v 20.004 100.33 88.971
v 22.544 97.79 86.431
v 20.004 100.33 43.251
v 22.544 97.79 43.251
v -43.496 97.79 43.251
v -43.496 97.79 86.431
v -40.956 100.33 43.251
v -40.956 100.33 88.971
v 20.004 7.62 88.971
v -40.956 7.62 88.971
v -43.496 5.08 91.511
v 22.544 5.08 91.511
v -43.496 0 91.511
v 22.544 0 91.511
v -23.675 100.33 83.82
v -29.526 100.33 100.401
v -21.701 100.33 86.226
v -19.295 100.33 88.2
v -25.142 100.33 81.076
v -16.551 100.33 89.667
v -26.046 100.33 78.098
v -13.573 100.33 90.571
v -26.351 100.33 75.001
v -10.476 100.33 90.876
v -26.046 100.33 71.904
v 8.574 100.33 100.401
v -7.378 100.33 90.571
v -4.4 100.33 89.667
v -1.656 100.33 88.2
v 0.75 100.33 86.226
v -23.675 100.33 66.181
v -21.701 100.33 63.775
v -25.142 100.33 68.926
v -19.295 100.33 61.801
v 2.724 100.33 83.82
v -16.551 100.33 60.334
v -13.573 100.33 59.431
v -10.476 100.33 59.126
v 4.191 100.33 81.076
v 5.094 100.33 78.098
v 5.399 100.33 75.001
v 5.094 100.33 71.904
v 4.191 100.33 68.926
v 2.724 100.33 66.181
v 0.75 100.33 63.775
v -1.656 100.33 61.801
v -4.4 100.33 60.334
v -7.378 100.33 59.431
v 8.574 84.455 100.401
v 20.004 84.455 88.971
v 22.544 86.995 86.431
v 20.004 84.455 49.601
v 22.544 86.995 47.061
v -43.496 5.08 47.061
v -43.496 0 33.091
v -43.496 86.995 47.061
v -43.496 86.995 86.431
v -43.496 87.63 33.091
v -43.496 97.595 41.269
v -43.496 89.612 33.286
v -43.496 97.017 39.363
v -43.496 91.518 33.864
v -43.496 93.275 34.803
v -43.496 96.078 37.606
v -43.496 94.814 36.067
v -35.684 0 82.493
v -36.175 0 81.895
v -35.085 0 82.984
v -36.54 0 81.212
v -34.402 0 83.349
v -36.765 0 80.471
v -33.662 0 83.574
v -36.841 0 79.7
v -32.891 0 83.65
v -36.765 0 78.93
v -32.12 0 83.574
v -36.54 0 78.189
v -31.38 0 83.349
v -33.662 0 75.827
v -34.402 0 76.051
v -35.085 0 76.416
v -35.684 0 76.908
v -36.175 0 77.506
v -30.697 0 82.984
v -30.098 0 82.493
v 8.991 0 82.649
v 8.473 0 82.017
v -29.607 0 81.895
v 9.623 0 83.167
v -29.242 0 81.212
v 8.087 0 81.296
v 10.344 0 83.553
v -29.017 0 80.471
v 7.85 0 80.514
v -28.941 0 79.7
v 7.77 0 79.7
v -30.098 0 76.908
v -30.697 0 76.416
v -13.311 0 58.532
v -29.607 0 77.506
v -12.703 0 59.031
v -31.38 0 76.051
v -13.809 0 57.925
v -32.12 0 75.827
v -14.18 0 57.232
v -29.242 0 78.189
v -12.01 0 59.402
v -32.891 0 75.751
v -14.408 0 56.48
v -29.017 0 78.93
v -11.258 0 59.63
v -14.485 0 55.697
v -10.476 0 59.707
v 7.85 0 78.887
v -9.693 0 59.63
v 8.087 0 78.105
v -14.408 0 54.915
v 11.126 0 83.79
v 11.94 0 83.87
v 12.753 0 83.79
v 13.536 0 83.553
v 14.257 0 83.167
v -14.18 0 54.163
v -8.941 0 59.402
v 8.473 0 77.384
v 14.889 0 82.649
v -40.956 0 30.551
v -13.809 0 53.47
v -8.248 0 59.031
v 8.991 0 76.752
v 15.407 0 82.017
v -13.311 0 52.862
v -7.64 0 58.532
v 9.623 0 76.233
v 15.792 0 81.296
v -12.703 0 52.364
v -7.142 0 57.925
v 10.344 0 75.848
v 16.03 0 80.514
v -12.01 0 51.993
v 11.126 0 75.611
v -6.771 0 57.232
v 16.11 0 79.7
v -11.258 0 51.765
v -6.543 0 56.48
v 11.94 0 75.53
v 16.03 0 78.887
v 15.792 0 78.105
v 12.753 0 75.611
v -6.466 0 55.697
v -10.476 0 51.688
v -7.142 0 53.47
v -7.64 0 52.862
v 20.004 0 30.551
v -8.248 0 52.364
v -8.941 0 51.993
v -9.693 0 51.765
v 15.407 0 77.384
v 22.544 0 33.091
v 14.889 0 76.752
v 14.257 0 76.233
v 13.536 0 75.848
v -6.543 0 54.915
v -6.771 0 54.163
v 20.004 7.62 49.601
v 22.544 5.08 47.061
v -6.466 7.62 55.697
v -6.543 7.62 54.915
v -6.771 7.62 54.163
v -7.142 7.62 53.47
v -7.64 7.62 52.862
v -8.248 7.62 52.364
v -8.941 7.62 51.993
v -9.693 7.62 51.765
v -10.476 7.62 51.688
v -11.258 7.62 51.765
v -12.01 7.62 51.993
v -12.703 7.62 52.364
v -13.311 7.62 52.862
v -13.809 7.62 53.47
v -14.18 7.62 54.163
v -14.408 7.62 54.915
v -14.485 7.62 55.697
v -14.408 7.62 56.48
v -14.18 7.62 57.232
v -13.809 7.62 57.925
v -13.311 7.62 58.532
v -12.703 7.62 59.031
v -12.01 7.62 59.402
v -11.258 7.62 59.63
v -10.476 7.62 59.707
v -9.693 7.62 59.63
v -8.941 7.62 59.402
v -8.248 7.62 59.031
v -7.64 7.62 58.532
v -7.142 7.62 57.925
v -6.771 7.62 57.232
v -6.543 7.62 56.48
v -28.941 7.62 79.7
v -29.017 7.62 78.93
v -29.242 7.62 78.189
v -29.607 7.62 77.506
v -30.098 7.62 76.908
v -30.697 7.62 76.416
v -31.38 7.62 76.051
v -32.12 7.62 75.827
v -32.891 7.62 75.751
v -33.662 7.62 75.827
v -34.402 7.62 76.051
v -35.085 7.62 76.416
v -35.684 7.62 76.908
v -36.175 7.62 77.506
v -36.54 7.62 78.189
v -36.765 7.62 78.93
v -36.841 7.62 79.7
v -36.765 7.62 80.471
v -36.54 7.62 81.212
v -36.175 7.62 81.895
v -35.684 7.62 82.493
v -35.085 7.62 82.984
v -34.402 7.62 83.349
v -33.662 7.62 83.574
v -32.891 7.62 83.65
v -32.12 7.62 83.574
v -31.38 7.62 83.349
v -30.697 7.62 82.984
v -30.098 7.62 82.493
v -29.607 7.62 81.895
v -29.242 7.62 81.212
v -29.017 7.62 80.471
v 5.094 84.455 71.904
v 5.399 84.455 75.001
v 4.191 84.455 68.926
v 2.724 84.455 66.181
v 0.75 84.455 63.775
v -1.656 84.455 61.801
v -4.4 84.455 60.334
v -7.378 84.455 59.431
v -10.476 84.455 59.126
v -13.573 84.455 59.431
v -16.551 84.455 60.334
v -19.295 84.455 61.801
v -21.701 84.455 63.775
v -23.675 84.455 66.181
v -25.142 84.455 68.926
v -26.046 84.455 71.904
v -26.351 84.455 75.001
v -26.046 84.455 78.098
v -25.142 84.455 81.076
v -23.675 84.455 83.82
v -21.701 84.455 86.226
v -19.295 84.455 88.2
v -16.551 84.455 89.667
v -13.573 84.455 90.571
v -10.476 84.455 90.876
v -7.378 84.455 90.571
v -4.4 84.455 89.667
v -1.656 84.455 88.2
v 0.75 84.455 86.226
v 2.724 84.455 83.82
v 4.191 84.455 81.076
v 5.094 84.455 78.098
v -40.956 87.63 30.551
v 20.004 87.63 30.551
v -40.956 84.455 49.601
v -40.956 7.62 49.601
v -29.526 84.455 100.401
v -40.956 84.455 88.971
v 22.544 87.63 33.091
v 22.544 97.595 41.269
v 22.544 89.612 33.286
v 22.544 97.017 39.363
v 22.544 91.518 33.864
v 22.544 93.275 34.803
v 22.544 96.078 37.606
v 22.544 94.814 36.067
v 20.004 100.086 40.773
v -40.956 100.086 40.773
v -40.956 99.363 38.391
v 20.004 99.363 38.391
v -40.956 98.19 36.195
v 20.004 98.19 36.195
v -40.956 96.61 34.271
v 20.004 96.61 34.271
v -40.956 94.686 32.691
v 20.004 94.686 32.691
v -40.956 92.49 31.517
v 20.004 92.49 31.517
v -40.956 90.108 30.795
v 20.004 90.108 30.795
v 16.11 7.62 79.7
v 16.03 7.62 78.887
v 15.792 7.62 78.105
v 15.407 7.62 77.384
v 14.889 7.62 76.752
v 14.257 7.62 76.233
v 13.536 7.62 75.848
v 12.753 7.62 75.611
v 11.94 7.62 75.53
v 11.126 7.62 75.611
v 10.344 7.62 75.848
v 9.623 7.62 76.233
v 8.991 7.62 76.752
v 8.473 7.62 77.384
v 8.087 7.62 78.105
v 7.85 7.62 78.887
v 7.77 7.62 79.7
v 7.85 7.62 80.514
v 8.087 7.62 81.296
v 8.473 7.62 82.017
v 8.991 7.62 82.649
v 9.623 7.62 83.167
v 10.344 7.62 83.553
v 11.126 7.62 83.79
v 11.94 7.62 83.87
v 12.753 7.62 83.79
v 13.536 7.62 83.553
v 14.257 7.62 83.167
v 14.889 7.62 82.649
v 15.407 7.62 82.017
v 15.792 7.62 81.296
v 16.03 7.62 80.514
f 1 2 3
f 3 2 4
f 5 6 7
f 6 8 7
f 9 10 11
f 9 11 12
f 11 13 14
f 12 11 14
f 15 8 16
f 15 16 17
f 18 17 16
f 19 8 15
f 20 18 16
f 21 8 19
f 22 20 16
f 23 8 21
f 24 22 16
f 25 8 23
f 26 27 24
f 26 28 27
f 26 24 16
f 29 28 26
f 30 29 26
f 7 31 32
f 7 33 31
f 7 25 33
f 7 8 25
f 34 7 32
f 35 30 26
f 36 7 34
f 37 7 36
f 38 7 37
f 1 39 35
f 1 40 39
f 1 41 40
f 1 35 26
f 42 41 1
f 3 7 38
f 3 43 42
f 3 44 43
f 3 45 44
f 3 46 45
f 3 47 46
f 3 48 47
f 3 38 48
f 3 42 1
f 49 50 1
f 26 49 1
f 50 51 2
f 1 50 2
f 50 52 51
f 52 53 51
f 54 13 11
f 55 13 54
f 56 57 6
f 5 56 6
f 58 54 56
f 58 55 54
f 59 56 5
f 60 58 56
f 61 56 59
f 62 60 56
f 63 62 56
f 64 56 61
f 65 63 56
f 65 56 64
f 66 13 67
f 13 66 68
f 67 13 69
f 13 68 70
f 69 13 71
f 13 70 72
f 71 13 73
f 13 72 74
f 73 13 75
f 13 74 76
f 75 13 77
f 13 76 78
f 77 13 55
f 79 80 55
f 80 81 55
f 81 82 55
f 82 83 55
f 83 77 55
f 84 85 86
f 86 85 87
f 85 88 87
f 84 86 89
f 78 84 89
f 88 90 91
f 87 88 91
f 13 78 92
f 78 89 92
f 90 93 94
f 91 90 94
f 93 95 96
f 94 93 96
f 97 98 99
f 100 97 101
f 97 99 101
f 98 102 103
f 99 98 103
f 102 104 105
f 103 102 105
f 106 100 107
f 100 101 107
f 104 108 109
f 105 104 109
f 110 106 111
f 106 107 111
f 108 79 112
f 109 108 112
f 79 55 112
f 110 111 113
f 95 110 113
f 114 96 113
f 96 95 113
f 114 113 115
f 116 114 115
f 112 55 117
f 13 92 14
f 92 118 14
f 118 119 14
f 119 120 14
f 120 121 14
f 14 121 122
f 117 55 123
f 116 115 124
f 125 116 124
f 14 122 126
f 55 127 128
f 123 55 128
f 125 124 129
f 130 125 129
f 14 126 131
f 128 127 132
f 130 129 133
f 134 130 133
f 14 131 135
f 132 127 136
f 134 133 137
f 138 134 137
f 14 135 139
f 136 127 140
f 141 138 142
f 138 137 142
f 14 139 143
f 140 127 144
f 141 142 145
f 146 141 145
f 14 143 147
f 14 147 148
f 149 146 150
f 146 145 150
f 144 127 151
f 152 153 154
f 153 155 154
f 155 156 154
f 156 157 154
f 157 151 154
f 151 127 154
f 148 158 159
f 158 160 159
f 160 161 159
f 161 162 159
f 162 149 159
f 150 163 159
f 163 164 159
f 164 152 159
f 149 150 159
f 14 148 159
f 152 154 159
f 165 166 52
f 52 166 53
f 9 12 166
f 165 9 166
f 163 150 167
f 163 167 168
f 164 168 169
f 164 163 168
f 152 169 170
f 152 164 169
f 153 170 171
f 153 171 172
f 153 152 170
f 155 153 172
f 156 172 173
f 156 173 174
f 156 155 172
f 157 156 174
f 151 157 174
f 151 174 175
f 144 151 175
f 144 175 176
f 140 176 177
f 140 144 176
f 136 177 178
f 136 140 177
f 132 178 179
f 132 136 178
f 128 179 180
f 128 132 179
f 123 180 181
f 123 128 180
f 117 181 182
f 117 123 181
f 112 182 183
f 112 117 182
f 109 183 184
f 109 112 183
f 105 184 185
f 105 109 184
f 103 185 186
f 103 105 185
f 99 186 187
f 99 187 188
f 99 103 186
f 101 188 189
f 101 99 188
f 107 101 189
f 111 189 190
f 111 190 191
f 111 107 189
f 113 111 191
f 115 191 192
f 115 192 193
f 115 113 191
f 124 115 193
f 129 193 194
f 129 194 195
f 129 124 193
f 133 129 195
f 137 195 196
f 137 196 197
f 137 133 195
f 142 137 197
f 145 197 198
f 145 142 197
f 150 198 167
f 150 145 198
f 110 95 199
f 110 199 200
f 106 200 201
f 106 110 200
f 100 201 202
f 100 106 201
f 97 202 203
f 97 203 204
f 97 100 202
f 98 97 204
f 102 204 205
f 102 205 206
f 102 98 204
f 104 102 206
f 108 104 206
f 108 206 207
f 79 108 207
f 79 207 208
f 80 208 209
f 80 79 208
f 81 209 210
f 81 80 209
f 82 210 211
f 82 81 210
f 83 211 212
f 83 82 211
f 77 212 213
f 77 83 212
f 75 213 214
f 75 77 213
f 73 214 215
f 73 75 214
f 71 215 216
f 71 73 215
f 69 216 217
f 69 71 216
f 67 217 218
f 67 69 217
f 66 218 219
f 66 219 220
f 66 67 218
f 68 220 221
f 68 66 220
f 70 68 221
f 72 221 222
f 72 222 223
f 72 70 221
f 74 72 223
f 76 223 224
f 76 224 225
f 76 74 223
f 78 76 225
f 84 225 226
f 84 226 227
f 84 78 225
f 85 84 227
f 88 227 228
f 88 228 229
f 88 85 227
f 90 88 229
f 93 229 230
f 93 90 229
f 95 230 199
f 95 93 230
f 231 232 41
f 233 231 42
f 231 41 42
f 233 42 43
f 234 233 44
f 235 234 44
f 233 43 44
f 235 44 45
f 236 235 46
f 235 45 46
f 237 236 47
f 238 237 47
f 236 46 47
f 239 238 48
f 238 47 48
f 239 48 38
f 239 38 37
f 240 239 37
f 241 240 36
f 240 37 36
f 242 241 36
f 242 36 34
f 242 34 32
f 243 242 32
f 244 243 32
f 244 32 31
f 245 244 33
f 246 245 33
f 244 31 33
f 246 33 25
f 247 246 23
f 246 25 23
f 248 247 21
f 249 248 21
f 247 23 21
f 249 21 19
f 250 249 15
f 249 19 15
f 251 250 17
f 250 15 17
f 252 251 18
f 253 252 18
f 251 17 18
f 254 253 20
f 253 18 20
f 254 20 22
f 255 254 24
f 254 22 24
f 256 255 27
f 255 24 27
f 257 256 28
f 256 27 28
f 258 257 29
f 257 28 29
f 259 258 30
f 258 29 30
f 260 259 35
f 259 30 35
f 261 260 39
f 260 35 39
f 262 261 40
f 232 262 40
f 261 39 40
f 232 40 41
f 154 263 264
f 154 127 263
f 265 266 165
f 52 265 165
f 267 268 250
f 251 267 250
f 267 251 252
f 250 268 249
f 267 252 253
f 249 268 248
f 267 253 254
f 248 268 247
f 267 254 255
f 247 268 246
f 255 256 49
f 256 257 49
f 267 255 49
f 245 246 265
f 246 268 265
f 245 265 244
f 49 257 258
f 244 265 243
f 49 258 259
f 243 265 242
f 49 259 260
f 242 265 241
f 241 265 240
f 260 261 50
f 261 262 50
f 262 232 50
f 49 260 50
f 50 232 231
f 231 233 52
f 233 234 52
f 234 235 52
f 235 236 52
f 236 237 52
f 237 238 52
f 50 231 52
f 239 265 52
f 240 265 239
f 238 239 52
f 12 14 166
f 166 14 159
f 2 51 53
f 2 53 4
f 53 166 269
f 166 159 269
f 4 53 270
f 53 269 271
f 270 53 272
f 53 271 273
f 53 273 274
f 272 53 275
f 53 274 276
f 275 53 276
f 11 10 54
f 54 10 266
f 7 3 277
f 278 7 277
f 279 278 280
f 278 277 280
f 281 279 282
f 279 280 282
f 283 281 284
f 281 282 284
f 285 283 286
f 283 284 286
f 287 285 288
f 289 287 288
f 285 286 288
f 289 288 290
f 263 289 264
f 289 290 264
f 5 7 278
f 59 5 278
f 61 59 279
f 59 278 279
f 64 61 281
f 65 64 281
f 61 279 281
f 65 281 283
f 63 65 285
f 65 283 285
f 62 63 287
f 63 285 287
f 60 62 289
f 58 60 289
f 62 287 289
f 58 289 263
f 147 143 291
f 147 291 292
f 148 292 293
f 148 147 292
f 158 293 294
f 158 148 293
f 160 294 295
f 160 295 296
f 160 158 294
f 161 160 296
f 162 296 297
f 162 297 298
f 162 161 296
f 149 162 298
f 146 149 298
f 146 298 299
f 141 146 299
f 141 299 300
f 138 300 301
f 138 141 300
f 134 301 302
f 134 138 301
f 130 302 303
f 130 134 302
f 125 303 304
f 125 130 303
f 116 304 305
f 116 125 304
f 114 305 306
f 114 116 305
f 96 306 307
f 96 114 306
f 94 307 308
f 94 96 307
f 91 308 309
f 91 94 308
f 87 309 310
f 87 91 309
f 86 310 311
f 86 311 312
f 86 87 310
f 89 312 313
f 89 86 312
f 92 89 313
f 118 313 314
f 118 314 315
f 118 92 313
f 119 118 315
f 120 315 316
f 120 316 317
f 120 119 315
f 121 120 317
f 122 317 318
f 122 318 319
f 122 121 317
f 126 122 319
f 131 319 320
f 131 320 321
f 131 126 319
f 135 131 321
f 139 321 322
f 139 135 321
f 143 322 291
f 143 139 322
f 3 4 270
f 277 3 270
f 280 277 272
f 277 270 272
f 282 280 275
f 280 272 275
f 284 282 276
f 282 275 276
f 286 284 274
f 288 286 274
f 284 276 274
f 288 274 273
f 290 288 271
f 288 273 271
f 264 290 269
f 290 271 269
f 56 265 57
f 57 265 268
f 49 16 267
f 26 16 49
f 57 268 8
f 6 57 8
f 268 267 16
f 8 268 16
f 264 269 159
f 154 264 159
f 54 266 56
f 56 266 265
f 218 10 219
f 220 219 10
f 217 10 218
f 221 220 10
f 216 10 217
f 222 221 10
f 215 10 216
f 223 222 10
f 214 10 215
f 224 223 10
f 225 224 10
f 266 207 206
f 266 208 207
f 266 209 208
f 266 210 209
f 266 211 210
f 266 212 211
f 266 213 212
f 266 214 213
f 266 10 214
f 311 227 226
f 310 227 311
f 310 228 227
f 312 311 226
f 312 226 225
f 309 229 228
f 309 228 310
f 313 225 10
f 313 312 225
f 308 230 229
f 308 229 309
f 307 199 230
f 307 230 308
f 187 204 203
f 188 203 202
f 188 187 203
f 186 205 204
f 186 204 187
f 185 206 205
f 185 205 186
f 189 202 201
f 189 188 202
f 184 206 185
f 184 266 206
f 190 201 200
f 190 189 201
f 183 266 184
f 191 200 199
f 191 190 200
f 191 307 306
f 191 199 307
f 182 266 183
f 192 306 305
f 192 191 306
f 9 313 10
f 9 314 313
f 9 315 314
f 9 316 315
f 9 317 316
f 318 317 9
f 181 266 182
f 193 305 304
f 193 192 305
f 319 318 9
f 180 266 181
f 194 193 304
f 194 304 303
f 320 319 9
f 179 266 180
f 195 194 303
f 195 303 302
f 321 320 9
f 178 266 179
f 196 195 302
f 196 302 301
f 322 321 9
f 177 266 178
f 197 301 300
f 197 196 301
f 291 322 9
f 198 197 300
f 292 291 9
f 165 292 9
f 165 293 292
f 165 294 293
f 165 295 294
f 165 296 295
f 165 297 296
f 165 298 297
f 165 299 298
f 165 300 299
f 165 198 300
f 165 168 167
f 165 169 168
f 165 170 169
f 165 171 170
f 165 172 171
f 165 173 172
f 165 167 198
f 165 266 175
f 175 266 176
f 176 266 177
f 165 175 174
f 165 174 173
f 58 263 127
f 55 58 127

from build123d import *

# Parameters (mm, degrees)
SKETCH1_W           = 66.04
SKETCH1_H           = 60.96
SKETCH1_R           = 3.949643495
SKETCH1_R_2         = 4.169884911
SKETCH1_R_3         = 4.009399438
BOSS_EXTRUDE1_DEPTH = 7.62
SKETCH3_W           = 66.04
SKETCH3_H           = 19.05
BOSS_EXTRUDE2_DEPTH = 92.71
SKETCH4_W           = 66.04
SKETCH4_H           = 15.875
BOSS_EXTRUDE3_DEPTH = 50.8
SKETCH5_R           = 15.875
CUT_EXTRUDE2_DEPTH  = 15.875
FILLET1_R           = 12.7
CHAMFER2_SIZE       = 2.54
CHAMFER3_SIZE       = 13.97


with BuildPart() as part:
    # Sketch1 → Boss-Extrude1 (new body)
    with BuildSketch(Plane(origin=(0, 0, 0), x_dir=(1, 0, 0), z_dir=(0, 1, 0))):
        with Locations((-10.475534623, -61.030768925)):
            Rectangle(SKETCH1_W, SKETCH1_H)
        with Locations((-32.891034623, -79.700340115)):
            Circle(SKETCH1_R, mode=Mode.SUBTRACT)
        with Locations((11.939965377, -79.700340115)):
            Circle(SKETCH1_R_2, mode=Mode.SUBTRACT)
        with Locations((-10.475534623, -55.697340115)):
            Circle(SKETCH1_R_3, mode=Mode.SUBTRACT)
    extrude(amount=BOSS_EXTRUDE1_DEPTH)

    # Sketch3 → Boss-Extrude2 (add)
    with BuildSketch(Plane(origin=(0, 7.62, 0), x_dir=(1, 0, 0), z_dir=(0, 1, 0))):
        with Locations((-10.475534623, -40.075768925)):
            Rectangle(SKETCH3_W, SKETCH3_H)
    extrude(amount=BOSS_EXTRUDE2_DEPTH)

    # Sketch4 → Boss-Extrude3 (add)
    with BuildSketch(Plane.XY.offset(49.600768925)):
        with Locations((-10.475534623, 92.3925)):
            Rectangle(SKETCH4_W, SKETCH4_H)
    extrude(amount=BOSS_EXTRUDE3_DEPTH)

    # Sketch5 → Cut-Extrude2 (cut)
    with BuildSketch(Plane(origin=(0, 100.33, 0), x_dir=(1, 0, 0), z_dir=(0, 1, 0))):
        with Locations((-10.475534623, -75.000768925)):
            Circle(SKETCH5_R)
    extrude(amount=-CUT_EXTRUDE2_DEPTH, mode=Mode.SUBTRACT)

    # Fillet1
    fillet1_edges = [part.edges().sort_by_distance(p)[0] for p in [
        (-10.475534623, 100.33, 30.550768925),
    ]]
    fillet(fillet1_edges, radius=FILLET1_R)

    # Chamfer2
    chamfer2_edges = [part.edges().sort_by_distance(p)[0] for p in [
        (-43.495534623, 7.62, 70.555768925),
        (22.544465377, 100.33, 71.825768925),
        (22.544465377, 46.0375, 49.600768925),
        (-43.495534623, 46.0375, 49.600768925),
        (-10.475534623, 7.62, 91.510768925),
        (-43.495534623, 84.455, 75.000768925),
        (22.544465377, 84.455, 75.000768925),
        (-43.495534623, 100.33, 71.825768925),
        (-43.495534623, 43.815, 30.550768925),
        (-43.495534623, 96.610256121, 34.270512804),
        (22.544465377, 43.815, 30.550768925),
        (22.544465377, 96.610256121, 34.270512804),
        (22.544465377, 7.62, 70.555768925),
    ]]
    chamfer(chamfer2_edges, length=CHAMFER2_SIZE)

    # Chamfer3
    chamfer3_edges = [part.edges().sort_by_distance(p)[0] for p in [
        (-43.495534623, 92.3925, 100.400768925),
        (22.544465377, 92.3925, 100.400768925),
    ]]
    chamfer(chamfer3_edges, length=CHAMFER3_SIZE)


solid = part.part
